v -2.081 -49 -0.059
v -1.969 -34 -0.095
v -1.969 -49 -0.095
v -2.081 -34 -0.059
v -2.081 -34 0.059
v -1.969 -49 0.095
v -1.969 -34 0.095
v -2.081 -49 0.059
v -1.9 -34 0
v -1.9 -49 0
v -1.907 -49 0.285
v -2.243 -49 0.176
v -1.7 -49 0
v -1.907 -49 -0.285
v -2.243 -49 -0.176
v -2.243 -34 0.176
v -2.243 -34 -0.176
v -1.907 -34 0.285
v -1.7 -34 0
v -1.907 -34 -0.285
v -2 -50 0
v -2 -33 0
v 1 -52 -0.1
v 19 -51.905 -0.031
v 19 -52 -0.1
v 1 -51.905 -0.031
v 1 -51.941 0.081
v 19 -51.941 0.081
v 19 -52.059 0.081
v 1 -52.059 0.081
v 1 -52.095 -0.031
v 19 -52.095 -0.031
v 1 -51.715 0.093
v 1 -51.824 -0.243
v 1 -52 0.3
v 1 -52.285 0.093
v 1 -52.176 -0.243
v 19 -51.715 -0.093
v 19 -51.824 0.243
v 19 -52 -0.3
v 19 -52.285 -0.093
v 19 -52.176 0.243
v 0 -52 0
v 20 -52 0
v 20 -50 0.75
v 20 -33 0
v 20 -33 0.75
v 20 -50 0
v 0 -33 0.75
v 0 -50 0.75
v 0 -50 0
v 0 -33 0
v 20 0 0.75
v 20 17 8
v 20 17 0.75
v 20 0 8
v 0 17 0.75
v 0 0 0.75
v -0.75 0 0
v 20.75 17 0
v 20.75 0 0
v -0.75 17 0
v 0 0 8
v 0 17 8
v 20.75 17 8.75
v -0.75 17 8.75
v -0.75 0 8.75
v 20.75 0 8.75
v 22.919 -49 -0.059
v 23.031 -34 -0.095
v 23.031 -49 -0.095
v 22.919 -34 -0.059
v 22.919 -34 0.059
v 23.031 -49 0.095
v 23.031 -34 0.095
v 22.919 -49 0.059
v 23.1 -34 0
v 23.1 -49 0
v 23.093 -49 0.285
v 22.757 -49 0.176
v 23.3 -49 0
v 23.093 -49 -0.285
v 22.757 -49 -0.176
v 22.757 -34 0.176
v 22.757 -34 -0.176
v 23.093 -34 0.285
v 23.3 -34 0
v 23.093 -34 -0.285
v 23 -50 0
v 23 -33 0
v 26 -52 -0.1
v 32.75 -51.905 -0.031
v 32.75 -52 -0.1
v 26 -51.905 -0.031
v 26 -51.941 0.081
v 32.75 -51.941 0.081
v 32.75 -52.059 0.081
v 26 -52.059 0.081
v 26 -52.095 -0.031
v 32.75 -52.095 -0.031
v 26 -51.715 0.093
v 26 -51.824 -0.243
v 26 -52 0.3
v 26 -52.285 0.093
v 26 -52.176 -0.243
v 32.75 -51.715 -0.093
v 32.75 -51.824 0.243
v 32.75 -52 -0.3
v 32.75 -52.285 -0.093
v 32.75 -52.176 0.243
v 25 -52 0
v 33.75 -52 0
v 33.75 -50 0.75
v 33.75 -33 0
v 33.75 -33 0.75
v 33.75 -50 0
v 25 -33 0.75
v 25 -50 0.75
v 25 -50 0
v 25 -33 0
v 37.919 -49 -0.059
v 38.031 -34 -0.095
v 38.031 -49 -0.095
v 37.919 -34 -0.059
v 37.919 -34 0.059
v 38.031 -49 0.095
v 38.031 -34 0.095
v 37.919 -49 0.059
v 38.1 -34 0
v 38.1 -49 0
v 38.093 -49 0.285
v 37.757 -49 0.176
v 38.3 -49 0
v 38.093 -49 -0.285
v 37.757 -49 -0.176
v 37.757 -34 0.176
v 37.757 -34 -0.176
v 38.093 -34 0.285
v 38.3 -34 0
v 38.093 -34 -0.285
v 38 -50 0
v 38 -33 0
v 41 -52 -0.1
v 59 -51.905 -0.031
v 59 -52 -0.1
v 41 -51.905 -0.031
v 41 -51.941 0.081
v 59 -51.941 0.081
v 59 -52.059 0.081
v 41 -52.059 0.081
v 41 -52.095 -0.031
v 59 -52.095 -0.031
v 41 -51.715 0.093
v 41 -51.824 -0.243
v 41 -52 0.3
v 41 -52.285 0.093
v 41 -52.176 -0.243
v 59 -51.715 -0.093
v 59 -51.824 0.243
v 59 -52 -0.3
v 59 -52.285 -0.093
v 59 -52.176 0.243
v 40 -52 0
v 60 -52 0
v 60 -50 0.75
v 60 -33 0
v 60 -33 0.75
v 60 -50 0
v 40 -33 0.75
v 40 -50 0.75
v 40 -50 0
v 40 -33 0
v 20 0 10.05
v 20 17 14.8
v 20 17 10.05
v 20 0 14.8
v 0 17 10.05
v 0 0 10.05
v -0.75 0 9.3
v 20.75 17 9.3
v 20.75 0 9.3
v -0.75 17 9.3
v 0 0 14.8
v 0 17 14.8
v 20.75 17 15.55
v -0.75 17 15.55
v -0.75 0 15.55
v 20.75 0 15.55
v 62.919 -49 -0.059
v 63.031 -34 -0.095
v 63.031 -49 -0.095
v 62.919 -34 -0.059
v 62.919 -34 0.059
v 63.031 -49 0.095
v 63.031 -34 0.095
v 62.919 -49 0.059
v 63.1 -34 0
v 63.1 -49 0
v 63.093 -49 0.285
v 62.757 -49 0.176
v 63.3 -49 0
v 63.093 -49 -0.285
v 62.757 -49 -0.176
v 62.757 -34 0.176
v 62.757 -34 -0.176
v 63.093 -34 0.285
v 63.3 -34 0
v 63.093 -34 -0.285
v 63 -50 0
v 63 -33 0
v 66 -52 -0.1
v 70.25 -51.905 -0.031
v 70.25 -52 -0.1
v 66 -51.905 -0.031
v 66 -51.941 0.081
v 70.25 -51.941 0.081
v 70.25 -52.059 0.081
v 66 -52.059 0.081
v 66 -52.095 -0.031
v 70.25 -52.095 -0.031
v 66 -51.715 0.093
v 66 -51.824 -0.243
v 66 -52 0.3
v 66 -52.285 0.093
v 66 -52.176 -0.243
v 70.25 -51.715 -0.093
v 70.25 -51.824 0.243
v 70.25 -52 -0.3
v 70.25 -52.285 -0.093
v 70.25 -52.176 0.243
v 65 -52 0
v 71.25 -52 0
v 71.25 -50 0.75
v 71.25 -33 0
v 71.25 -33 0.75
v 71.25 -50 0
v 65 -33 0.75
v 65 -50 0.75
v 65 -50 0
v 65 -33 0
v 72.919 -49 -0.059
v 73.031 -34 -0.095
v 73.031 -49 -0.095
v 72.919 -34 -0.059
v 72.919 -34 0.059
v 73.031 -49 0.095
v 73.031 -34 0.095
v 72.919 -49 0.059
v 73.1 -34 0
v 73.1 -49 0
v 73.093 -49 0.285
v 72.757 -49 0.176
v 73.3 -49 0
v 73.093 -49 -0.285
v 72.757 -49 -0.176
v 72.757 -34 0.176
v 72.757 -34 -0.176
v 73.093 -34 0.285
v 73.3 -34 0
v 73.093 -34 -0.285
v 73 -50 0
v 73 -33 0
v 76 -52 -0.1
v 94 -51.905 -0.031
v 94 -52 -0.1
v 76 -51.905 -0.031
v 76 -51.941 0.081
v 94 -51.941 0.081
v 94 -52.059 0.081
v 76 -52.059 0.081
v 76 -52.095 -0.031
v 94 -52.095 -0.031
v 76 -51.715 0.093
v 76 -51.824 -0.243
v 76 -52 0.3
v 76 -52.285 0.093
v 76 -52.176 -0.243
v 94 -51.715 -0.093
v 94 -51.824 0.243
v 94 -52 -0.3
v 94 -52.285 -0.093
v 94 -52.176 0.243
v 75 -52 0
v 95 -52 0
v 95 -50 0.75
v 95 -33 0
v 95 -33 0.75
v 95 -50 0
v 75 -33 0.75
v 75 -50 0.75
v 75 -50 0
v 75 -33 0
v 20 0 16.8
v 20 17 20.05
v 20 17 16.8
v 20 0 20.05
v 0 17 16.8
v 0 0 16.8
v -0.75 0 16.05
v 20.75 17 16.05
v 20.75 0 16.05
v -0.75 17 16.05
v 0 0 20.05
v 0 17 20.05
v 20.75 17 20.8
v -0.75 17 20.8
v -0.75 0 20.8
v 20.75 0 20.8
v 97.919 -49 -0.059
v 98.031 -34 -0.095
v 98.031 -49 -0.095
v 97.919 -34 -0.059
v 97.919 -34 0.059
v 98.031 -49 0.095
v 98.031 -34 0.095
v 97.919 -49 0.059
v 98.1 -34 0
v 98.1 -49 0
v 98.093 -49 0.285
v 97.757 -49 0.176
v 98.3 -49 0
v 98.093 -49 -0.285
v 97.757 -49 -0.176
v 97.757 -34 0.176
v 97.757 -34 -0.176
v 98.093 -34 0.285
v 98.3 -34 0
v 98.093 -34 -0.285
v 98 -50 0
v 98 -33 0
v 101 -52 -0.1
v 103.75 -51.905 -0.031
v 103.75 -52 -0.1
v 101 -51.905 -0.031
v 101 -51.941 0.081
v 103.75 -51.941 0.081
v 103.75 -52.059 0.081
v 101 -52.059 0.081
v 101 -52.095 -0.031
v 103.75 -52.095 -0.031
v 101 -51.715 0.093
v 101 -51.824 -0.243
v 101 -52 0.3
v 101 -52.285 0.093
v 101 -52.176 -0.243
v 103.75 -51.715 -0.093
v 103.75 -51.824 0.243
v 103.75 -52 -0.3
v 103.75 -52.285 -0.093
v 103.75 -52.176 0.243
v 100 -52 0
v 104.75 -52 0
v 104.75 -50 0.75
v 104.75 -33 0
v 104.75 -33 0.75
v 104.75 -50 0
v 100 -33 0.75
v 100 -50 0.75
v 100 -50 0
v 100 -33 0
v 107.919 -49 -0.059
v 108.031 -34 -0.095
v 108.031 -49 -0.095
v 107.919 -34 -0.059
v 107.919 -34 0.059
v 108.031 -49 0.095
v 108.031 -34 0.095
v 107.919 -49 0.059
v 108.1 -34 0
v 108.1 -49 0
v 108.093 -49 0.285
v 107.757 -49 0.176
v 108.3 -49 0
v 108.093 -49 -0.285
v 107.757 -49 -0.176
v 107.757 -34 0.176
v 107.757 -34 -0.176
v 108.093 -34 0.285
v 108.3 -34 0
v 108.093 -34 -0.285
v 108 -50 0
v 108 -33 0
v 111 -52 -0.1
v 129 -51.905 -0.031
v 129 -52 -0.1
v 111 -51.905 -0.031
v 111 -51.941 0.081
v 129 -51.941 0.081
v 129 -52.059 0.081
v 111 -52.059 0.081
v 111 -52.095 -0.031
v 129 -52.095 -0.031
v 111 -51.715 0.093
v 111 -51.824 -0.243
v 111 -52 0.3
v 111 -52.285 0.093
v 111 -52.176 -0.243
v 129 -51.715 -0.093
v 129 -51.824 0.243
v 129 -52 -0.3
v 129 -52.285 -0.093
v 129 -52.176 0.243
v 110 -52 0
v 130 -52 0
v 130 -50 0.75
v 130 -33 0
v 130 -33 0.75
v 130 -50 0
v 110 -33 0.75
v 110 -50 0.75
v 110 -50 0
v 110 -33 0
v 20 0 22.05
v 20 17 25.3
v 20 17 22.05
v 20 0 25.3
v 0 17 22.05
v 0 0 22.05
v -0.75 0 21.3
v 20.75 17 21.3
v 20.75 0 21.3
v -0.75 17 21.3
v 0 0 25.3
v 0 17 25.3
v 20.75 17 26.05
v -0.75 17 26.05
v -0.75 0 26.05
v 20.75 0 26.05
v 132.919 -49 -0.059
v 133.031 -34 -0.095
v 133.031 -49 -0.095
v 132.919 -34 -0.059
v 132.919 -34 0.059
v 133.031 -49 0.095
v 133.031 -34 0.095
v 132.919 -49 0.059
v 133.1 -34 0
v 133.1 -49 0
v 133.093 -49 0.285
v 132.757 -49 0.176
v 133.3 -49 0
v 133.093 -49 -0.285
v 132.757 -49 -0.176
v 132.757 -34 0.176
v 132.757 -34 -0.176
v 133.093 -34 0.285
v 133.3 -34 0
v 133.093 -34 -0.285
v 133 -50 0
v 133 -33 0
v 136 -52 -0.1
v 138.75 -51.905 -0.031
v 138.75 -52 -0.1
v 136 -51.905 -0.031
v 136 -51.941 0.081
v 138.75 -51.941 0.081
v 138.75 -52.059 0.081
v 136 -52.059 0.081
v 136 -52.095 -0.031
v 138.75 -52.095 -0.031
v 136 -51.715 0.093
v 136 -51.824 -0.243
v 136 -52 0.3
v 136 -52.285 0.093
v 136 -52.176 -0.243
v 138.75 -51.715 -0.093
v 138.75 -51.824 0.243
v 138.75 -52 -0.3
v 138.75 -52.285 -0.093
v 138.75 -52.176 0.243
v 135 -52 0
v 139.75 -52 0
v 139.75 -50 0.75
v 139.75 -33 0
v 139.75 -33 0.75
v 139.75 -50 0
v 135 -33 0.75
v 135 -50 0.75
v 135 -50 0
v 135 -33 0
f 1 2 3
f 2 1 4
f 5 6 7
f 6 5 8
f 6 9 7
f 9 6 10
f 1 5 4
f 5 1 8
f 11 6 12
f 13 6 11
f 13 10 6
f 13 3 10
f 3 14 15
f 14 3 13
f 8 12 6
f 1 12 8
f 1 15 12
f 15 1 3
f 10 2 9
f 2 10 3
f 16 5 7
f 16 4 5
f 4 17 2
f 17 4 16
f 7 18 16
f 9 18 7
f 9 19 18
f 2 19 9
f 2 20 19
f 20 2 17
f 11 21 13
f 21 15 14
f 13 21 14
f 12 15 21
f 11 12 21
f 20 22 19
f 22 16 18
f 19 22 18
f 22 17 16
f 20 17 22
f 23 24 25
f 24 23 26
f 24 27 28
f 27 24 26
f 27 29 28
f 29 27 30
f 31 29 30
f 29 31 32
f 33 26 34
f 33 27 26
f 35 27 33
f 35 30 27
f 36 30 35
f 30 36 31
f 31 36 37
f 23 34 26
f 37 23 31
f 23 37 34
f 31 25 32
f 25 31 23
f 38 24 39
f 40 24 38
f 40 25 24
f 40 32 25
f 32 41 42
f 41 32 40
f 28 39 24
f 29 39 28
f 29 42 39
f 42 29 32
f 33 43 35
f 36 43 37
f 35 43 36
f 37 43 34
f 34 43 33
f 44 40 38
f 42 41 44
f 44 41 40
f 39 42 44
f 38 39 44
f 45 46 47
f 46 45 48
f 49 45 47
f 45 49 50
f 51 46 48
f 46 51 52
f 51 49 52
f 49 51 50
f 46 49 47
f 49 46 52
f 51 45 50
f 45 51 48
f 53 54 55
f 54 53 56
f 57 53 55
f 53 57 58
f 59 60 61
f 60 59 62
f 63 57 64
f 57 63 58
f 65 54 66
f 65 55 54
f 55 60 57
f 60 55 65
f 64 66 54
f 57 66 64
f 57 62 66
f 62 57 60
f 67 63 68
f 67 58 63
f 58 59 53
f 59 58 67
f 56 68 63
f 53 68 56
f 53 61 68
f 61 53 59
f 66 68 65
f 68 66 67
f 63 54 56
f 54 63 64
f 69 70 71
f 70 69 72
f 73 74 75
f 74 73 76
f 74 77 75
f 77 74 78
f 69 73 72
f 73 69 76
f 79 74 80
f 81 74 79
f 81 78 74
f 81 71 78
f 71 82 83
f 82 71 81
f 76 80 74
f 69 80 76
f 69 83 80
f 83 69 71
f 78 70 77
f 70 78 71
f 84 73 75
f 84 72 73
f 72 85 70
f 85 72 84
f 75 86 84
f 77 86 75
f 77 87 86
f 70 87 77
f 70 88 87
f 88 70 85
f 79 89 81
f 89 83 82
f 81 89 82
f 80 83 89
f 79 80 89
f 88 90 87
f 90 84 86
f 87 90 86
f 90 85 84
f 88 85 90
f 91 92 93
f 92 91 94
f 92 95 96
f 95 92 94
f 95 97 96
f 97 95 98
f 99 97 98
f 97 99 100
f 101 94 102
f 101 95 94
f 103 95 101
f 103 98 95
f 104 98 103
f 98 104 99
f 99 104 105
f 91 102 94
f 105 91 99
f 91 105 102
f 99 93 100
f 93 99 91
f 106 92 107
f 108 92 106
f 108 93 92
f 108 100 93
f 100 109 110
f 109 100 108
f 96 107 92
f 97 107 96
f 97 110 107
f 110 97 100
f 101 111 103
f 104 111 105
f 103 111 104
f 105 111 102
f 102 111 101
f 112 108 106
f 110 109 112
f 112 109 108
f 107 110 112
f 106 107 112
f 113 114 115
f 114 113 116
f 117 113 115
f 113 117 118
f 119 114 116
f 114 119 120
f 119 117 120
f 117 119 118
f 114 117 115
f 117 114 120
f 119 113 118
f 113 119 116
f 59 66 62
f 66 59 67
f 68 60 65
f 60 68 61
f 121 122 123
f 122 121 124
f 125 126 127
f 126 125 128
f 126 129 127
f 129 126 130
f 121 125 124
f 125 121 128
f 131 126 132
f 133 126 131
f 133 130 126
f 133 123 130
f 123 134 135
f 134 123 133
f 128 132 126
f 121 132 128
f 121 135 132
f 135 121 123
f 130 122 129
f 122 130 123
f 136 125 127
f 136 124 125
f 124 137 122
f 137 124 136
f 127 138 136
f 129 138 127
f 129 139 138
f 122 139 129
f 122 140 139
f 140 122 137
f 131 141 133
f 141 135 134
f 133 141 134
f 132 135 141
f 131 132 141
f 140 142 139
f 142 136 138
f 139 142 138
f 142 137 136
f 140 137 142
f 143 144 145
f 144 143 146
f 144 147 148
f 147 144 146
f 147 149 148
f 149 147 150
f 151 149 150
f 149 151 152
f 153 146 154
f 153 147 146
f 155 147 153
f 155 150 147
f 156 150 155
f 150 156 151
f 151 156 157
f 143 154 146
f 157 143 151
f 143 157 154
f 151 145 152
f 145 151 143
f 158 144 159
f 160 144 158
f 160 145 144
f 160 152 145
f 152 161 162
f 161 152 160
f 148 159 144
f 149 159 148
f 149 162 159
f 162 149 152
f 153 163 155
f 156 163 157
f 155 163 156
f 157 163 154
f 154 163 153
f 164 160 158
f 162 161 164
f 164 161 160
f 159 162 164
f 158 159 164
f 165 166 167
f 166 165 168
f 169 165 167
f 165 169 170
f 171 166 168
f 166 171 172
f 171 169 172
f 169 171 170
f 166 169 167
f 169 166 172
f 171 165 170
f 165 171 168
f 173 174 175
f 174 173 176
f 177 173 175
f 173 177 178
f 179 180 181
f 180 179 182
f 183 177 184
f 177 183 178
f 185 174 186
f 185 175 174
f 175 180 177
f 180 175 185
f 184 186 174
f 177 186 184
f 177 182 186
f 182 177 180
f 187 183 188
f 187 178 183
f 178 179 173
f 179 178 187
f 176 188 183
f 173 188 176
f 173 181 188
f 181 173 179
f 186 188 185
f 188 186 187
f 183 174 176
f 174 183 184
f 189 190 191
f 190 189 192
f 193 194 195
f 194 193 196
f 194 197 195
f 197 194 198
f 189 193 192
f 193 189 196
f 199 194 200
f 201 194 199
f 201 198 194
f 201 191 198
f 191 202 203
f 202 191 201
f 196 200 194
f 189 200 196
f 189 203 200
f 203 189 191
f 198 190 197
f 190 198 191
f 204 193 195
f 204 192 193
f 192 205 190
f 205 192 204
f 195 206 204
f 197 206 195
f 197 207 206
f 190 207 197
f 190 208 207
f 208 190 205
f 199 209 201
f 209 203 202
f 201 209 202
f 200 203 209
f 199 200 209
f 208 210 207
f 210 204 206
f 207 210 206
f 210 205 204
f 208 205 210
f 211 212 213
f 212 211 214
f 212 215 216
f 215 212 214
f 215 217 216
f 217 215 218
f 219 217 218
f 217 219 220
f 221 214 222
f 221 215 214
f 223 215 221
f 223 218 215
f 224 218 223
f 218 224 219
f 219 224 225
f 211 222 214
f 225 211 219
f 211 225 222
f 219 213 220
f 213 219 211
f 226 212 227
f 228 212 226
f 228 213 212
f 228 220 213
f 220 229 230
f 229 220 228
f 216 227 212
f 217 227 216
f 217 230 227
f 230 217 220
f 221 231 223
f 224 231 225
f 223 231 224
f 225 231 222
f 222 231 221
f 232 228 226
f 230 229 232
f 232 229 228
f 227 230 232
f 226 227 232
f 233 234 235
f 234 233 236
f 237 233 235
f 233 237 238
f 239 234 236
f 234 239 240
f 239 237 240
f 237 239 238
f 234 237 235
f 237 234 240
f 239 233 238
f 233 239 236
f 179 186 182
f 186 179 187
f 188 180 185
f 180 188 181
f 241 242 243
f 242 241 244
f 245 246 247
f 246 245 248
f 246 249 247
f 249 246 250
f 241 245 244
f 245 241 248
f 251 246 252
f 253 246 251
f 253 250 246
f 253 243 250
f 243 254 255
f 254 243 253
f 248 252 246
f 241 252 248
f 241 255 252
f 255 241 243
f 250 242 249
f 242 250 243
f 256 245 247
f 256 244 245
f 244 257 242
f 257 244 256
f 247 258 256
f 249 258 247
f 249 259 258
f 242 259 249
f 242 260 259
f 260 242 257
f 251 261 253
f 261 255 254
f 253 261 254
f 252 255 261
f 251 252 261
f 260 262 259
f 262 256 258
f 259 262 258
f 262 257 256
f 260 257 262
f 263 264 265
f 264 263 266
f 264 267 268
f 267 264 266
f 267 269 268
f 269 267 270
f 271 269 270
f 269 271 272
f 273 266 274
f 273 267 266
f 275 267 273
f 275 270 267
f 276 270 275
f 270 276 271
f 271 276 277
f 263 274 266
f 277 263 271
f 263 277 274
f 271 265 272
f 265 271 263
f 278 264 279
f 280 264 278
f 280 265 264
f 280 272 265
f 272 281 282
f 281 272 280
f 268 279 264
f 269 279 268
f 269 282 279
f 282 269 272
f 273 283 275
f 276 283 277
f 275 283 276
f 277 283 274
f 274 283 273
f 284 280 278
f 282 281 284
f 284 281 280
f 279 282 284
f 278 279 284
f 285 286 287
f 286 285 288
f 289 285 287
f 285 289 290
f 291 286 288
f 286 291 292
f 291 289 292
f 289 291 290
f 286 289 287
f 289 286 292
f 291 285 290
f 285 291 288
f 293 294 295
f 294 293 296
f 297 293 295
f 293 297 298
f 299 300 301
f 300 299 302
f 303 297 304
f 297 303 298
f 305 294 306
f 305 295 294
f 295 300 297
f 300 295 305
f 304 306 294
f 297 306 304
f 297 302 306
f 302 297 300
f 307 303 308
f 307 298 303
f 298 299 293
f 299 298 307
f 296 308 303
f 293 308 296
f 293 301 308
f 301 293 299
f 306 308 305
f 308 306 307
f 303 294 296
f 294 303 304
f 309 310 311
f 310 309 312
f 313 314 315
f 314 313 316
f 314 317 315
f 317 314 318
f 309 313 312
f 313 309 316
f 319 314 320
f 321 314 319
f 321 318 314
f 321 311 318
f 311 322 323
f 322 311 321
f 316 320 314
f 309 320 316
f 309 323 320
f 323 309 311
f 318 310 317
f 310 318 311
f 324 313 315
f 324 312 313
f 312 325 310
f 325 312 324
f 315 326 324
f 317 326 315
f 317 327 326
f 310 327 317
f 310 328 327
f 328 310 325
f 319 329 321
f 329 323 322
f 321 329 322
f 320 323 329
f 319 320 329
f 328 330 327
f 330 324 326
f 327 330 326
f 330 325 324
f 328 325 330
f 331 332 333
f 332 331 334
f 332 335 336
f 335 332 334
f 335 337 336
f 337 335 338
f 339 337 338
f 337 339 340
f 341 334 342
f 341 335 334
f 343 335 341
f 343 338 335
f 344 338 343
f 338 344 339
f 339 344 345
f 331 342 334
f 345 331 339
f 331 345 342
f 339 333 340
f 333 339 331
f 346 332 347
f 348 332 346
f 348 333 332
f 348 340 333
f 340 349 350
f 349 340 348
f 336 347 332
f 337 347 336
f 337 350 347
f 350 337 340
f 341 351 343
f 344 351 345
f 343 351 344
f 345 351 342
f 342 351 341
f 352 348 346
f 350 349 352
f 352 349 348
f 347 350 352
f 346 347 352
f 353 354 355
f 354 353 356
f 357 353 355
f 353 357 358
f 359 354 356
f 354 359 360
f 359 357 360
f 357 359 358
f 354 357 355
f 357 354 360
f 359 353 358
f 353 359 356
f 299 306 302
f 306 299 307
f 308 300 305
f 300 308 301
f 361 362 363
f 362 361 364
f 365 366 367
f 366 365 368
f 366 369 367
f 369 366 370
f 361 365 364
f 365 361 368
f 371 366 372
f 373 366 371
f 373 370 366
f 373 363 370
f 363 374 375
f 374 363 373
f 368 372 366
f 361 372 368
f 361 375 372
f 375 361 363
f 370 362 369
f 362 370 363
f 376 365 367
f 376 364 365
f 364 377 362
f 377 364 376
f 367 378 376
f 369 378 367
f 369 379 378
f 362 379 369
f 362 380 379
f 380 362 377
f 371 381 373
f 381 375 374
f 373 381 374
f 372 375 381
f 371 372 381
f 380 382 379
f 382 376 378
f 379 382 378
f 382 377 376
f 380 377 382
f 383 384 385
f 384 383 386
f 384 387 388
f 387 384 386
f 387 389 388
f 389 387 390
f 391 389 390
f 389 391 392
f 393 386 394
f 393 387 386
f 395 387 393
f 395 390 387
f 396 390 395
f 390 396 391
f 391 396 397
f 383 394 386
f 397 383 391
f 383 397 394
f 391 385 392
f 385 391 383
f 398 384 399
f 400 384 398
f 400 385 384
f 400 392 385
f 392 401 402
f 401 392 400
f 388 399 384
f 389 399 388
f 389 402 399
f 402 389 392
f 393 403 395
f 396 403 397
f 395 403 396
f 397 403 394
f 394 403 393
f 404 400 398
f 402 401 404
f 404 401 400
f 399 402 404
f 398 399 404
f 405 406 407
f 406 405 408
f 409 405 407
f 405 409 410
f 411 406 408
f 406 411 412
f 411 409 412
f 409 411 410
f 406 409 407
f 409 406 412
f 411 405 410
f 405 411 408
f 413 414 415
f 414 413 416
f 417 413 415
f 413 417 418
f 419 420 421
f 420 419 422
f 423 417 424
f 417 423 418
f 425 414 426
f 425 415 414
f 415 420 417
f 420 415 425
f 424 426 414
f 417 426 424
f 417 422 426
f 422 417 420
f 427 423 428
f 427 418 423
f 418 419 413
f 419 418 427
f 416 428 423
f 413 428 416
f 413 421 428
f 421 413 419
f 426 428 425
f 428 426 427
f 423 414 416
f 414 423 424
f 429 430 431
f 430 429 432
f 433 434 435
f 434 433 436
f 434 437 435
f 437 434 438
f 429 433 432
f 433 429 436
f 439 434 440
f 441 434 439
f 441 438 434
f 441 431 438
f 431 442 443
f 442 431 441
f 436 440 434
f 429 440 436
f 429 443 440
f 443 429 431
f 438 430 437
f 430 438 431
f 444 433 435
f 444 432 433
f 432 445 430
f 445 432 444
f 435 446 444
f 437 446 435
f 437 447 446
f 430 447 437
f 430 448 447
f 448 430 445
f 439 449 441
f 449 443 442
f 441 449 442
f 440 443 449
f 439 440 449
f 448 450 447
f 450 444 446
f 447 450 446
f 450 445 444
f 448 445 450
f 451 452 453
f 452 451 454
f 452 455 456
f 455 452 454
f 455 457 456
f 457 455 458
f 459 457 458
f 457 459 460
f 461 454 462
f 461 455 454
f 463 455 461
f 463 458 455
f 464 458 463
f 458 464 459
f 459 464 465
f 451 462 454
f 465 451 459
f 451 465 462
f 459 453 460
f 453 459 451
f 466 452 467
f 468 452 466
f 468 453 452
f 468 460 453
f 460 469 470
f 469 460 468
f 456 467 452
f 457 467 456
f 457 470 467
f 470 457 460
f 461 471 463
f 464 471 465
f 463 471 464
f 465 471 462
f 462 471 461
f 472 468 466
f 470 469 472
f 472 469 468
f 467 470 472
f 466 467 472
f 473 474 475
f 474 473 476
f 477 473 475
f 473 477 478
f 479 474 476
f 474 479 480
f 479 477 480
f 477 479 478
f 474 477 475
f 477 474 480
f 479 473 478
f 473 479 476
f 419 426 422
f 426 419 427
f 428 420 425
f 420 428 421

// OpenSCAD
/*
Set 1: 20 X 8 X 17
Set 2: 20 X 5.5 X 17
Set 3: 20 X 4 X 17
Set 4: 20 X 4 x 17
Spacer: 0.5
*/

//--------------------------------------------------------------------------------------------------
// Common moudles
//--------------------------------------------------------------------------------------------------

// X dimensional arrow
module arrow_x(l)
{
    line_w = 0.1;
    arrow_w = 1;
    arrow_h = 0.3;

    // Line
    translate([l / 2, 0, 0])
    {
        rotate([0, 90, 0])
        {
            color([0.4, 0.4, 0.4])
            cylinder(l - arrow_w * 2, line_w, line_w, true);
        }
    }

    // Left arrow
    translate([arrow_w, 0, 0])
    {
        rotate([0, 270, 0])
        {
            color([0.4, 0.4, 0.4])
            cylinder(arrow_w, arrow_h, 0, false);
        }
    }

    // Right arrow
    translate([l - arrow_w, 0, 0])
    {
        rotate([0, 90, 0])
        {
            color([0.4, 0.4, 0.4])
            cylinder(arrow_w, arrow_h, 0, false);
        }
    }

    // Text
    translate([l/3, 0.5, 0])
    {
        color([0.4, 0.4, 0.4])
        text(str(l), size=1);
    }
}

// Y dimensional arrow
module arrow_y(l)
{
    line_w = 0.1;
    arrow_w = 1;
    arrow_h = 0.3;

    // Line
    translate([0, l / 2, 0])
    {
        rotate([90, 0, 00])
        {
            color([0.4, 0.4, 0.4])
            cylinder(l - arrow_w * 2, line_w, line_w, true);
        }
    }

    // Left arrow
    translate([0 ,arrow_w, 0])
    {
        rotate([90, 0, 0])
        {
            color([0.4, 0.4, 0.4])
            cylinder(arrow_w, arrow_h, 0, false);
        }
    }

    // Right arrow
    translate([0, l - arrow_w, 0])
    {
        rotate([270, 0, 0])
        {
            color([0.4, 0.4, 0.4])
            cylinder(arrow_w, arrow_h, 0, false);
        }
    }

    // Text
    translate([-0.5, l/3, 0])
    {
        rotate([0 ,0, 90])
        {
            color([0.4, 0.4, 0.4])
            text(str(l), size=1);
        }
    }
}

module dimension(x, y, z, r, g, b, dx, dy = 50)
{
    translate([dx, -dy, 0])
    {
        color([r, g, b])
        cube([x, y, z]);

        translate([-2, 0, 0])
        {
            arrow_y(y);
        }

        translate([0, -2, 0])
        {
            arrow_x(x);
        }
    }
}

DimensionY = 50;

module board(x, y, z, r, g, b, posX, posY, posZ, rotX, rotY, rotZ, dimX, dimY = DimensionY)
{
    translate([posX, posY, posZ])
    {
        rotate([rotX, rotY, rotZ])
        {
            color([r, g, b])
            cube([x, y, z]);
        }
    }

    dimension(x, y, z, r, g, b, dimX, dimY);
}

//------------------------------------------------------------------------------
// Draw parts
//------------------------------------------------------------------------------

//------------------------------------------------------------------------------
//Set 1: 20 X 8 X 17
//------------------------------------------------------------------------------
board(
    20, 17, 0.75,
    1, 0, 0,
    0, 0, 0,
    0, 0, 0,
    0, DimensionY);

board(
    20, 17, 0.75,
    1, 0, 0,
    0, 0, 8,
    0, 0, 0,
    0, DimensionY);

board(8.75, 17, 0.75,
    0, 1, 0,
    0, 0, 0,
    0, 270, 0,
    25, DimensionY);

board(8.75, 17, 0.75,
    0, 1, 0,
    20.75, 0, 0,
    0, 270, 0,
    25, DimensionY);

//------------------------------------------------------------------------------
// Set 2: 20 X 5.5 X 17
//------------------------------------------------------------------------------
board(
    20, 17, 0.75,
    1, 1, 0,
    0, 0, 8.8 + 0.5,
    0, 0, 0,
    40, DimensionY);

board(
    20, 17, 0.75,
    1, 1, 0,
    0, 0, 8.8 + 0.5 + 5.5,
    0, 0, 0,
    40, DimensionY);

board(6.25, 17, 0.75,
    0, 1, 1,
    0, 0, 8.8 + 0.5,
    0, 270, 0,
    65, DimensionY);

board(6.25, 17, 0.75,
    0, 1, 1,
    20.75, 0, 8.8 + 0.5,
    0, 270, 0,
    65, DimensionY);

//------------------------------------------------------------------------------
// Set 3: 20 X 4 X 17
//------------------------------------------------------------------------------
board(
    20, 17, 0.75,
    1, 0, 1,
    0, 0, 8.8 + 0.5 + 5.5 + 0.5 + 0.75,
    0, 0, 0,
    75, DimensionY);

board(
    20, 17, 0.75,
    1, 0, 1,
    0, 0, 8.8 + 0.5 + 5.5 + 0.5 + 0.75 + 4,
    0, 0, 0,
    75, DimensionY);

board(4.75, 17, 0.75,
    0, 0.7, 0.3,
    0, 0, 8.8 + 0.5 + 5.5 + 0.5 + 0.75,
    0, 270, 0,
    100, DimensionY);

board(4.75, 17, 0.75,
    0, 0.7, 0.3,
    20.75, 0, 8.8 + 0.5  + 5.5 + 0.5 + 0.75,
    0, 270, 0,
    100, DimensionY);

//------------------------------------------------------------------------------
// Set 4: 20 X 4 x 17
//------------------------------------------------------------------------------
board(
    20, 17, 0.75,
    0.3, 0.3, 0.3,
    0, 0, 8.8 + 0.5 + 5.5 + 0.5 + 0.75 + 4 + 0.75 + 0.5,
    0, 0, 0,
    110, DimensionY);

board(
    20, 17, 0.75,
    0.3, 0.3, 0.3,
    0, 0, 8.8 + 0.5 + 5.5 + 0.5 + 0.75 + 4 + 0.75 + 0.5 + 4,
    0, 0, 0,
    110, DimensionY);

board(4.75, 17, 0.75,
    0.5, 0.7, 0.3,
    0, 0, 8.8 + 0.5 + 5.5 + 0.5 + 0.75 + 4 + 0.75 + 0.5,
    0, 270, 0,
    135, DimensionY);

board(4.75, 17, 0.75,
    0.5, 0.7, 0.3,
    20.75, 0, 8.8 + 0.5  + 5.5 + 0.5 + 0.75 + 4 + 0.75 + 0.5,
    0, 270, 0,
    135, DimensionY);

//------------------------------------------------------------------------------
// Spacer: 0.5
//------------------------------------------------------------------------------
